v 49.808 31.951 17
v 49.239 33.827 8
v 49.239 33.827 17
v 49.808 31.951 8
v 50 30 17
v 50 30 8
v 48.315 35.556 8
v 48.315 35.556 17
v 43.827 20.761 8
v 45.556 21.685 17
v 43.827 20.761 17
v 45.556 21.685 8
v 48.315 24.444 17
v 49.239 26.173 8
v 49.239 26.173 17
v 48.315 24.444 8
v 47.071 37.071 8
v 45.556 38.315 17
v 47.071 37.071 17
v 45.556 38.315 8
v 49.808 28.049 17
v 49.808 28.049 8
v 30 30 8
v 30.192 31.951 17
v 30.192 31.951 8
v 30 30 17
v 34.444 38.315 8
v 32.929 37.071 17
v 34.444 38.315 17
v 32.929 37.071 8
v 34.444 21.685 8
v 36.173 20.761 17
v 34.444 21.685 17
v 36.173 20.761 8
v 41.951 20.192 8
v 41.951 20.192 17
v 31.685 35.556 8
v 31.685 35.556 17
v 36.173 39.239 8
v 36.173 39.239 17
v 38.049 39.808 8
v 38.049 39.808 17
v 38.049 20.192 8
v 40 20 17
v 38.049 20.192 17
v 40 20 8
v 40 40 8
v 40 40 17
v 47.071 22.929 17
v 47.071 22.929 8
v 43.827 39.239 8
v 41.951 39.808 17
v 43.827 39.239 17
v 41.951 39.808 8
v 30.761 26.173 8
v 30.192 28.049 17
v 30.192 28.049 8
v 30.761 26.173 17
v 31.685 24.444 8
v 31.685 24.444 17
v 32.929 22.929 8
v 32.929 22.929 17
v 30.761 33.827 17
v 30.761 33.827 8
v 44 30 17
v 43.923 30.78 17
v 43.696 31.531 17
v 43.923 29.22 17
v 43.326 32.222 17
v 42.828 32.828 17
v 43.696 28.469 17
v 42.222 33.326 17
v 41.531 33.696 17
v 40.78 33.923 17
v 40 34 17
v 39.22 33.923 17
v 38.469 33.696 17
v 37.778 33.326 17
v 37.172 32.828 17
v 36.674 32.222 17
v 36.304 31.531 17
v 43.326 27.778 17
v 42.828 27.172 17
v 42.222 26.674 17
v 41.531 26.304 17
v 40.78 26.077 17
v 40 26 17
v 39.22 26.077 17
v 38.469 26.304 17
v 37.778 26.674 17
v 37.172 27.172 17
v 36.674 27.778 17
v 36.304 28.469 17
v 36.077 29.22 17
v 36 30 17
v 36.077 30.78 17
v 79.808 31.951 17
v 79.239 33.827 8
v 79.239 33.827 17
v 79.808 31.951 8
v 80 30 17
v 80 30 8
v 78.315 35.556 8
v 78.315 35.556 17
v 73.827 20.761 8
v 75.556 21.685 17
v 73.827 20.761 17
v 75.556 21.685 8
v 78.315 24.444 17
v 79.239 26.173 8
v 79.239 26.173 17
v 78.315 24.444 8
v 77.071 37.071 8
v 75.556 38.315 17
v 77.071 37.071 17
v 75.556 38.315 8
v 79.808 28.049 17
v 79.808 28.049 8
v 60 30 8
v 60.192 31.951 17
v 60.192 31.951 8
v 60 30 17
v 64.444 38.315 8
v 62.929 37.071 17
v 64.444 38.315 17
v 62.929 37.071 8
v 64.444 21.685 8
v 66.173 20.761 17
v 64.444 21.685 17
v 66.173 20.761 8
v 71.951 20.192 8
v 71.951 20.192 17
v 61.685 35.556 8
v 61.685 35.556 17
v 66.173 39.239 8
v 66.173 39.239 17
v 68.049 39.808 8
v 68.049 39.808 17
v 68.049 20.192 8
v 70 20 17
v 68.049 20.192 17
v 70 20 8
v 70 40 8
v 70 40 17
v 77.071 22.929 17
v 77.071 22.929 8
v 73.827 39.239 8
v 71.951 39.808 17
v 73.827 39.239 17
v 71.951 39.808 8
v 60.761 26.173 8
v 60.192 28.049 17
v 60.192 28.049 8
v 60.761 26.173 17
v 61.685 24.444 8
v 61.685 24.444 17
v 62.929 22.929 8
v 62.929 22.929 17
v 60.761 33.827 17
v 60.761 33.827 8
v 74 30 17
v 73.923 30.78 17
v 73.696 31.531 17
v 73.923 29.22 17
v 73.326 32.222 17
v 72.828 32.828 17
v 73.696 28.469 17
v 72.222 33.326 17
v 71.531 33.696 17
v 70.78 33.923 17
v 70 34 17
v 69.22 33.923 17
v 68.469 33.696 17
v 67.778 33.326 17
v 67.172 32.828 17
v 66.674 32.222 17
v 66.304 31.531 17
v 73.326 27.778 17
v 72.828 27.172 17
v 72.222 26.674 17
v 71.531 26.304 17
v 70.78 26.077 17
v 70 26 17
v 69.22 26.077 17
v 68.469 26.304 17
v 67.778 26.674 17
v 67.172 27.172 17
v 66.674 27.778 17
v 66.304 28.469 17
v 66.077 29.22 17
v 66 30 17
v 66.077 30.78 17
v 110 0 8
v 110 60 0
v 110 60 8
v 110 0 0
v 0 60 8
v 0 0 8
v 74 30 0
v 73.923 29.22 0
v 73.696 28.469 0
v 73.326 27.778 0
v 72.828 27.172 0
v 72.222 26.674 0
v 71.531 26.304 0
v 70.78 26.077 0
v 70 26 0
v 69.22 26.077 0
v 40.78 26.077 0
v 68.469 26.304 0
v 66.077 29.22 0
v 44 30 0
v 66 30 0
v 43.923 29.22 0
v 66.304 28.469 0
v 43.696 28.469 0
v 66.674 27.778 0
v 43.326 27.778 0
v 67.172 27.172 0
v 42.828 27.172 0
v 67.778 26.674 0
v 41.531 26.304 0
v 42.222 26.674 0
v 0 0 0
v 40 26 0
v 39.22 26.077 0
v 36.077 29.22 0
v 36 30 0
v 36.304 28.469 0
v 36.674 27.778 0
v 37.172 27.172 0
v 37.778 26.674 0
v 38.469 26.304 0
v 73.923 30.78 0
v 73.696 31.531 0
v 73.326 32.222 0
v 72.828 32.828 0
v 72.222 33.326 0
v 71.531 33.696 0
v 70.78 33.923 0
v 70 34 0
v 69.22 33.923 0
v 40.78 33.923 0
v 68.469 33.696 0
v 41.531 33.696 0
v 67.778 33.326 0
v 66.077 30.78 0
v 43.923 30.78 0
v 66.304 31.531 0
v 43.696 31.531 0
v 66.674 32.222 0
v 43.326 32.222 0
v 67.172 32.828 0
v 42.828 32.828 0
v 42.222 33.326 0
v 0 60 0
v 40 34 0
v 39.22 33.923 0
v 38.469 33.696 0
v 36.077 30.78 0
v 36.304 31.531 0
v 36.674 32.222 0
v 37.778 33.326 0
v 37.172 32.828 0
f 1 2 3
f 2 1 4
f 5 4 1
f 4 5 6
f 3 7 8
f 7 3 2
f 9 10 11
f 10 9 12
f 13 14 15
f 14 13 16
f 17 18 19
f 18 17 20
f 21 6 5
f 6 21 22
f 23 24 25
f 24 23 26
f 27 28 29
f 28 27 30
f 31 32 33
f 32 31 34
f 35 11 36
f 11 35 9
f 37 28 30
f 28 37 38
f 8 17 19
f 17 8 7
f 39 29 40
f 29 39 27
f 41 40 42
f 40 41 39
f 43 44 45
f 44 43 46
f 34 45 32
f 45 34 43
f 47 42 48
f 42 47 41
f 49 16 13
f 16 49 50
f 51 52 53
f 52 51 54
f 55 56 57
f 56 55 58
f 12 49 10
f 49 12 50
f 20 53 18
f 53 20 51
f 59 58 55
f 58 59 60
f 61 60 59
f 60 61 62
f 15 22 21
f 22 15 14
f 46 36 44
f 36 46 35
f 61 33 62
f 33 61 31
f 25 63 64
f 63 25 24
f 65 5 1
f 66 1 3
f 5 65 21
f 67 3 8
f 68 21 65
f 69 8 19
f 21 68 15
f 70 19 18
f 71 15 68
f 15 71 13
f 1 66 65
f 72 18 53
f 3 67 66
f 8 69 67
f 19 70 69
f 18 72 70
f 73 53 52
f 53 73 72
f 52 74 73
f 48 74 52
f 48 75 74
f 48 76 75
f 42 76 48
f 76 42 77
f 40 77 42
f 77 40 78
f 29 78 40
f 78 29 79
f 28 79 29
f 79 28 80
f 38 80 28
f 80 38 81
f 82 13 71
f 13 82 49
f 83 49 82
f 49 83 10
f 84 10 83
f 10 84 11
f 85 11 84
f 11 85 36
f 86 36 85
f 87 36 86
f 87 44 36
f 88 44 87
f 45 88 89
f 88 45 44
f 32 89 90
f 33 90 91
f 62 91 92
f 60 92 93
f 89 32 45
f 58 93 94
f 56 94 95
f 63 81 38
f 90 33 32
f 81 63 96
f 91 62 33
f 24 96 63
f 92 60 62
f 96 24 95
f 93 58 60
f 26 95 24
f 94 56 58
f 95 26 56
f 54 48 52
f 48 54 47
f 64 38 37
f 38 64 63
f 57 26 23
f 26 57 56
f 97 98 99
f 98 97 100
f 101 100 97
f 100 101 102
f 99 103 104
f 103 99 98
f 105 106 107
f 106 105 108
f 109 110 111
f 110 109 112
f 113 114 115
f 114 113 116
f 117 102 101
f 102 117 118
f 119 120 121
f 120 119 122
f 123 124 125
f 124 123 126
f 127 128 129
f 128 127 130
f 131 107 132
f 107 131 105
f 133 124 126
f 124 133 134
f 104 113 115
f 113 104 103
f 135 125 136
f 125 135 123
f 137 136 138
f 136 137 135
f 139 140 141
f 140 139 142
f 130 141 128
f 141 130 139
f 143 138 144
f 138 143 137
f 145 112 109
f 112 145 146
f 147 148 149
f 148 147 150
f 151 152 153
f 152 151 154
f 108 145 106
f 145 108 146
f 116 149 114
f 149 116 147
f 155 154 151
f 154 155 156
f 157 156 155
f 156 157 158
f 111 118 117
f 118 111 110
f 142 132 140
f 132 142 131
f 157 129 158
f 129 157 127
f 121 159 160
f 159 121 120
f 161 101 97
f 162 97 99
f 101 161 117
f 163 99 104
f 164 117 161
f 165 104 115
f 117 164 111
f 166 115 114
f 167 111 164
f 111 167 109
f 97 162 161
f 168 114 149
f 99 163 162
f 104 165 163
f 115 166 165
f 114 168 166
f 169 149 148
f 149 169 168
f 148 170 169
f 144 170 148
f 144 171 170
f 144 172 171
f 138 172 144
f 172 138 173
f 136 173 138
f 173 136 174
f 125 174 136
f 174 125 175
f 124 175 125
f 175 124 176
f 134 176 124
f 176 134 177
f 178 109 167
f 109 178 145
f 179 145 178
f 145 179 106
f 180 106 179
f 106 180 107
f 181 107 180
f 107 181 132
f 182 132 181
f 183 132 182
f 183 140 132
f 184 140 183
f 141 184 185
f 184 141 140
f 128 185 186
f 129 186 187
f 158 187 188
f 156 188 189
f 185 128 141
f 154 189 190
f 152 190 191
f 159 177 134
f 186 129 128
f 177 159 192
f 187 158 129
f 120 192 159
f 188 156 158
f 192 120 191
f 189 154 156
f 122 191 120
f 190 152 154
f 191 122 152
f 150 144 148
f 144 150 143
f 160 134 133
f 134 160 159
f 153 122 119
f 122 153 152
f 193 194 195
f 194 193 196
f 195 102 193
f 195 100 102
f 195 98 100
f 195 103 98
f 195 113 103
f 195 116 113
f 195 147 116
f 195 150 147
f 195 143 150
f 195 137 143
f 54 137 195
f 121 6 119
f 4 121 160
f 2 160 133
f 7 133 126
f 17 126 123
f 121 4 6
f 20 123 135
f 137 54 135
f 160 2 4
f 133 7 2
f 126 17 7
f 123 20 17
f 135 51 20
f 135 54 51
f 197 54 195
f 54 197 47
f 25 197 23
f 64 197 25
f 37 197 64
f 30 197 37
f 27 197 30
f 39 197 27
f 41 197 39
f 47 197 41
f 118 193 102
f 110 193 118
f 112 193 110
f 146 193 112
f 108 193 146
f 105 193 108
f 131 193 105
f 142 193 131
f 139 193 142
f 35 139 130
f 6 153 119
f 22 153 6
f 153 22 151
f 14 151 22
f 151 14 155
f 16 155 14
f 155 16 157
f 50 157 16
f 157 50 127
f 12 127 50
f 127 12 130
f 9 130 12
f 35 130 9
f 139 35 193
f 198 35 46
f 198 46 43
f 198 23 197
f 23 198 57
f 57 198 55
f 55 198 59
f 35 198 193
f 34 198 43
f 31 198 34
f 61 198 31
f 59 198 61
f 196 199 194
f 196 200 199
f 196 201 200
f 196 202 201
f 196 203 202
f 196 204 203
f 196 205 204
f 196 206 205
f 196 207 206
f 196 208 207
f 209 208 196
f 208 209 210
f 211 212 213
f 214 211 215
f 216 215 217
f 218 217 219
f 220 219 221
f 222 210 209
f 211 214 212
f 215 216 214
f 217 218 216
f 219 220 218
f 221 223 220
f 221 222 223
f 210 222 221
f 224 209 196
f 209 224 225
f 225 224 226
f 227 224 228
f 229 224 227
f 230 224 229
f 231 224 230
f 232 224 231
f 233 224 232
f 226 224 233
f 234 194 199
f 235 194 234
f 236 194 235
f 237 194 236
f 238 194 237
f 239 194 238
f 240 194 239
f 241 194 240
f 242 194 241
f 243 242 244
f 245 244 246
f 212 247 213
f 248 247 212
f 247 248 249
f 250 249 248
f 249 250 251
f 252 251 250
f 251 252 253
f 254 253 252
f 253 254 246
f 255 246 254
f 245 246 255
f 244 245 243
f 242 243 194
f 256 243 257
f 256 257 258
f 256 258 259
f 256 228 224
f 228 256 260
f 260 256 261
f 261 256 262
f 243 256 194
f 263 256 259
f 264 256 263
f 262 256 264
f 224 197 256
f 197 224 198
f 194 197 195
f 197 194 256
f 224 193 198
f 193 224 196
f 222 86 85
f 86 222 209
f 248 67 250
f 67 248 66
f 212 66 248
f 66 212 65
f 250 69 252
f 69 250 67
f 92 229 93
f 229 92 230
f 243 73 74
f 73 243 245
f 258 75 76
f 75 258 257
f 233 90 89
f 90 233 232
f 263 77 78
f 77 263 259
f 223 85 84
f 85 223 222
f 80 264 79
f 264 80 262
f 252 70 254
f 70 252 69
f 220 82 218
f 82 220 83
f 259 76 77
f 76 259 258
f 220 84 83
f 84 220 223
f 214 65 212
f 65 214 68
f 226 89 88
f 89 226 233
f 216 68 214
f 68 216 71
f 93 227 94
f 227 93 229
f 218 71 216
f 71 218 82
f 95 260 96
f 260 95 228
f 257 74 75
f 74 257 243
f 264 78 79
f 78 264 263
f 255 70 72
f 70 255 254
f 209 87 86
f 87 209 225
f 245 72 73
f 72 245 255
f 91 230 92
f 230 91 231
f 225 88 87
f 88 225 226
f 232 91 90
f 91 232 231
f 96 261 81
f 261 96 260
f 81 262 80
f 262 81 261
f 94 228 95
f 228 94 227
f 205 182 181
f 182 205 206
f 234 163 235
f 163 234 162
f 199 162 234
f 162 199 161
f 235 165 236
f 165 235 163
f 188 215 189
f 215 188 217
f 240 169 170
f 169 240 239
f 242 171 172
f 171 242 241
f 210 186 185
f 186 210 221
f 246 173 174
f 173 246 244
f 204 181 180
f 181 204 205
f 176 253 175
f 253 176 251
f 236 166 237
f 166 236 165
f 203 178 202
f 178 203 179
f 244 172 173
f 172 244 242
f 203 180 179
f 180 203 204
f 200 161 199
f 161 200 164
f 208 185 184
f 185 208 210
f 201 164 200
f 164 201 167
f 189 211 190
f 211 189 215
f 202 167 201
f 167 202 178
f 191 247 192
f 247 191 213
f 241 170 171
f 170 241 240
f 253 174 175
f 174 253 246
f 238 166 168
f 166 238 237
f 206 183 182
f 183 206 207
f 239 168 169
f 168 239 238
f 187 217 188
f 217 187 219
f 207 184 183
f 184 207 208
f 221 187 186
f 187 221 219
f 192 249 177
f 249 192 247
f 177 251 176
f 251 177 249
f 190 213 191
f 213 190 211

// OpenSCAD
$fn = 32;

// ----------------------------------------------------------------------
// Drill jig: two_boss jig
// ----------------------------------------------------------------------

// --- parameters (mm) ---
plate_l = 110;            // plate length, X
plate_w = 60;             // plate width, Y
plate_t = 8;              // plate thickness
boss_d = 20;              // guide boss diameter
boss_h = 10;              // boss height above the plate
guide_d = 8;              // guide hole diameter
boss_pitch = 30;          // boss pitch

n_boss = 2;  // guide bosses
boss_x0 = (plate_l - (n_boss - 1) * boss_pitch) / 2;  // first boss X
boss_top = plate_t - 1 + boss_h;  // boss crown height
total_h = boss_top;  // overall height

difference() {
  union() {
  cube([plate_l, plate_w, plate_t]);
  for (i = [0 : n_boss - 1])
    translate([boss_x0 + i * boss_pitch, plate_w / 2, plate_t - 1])
      cylinder(h = boss_h, d = boss_d);
  }
  for (i = [0 : n_boss - 1])
    translate([boss_x0 + i * boss_pitch, plate_w / 2, -1])
      cylinder(h = plate_t + boss_h, d = guide_d);
}
